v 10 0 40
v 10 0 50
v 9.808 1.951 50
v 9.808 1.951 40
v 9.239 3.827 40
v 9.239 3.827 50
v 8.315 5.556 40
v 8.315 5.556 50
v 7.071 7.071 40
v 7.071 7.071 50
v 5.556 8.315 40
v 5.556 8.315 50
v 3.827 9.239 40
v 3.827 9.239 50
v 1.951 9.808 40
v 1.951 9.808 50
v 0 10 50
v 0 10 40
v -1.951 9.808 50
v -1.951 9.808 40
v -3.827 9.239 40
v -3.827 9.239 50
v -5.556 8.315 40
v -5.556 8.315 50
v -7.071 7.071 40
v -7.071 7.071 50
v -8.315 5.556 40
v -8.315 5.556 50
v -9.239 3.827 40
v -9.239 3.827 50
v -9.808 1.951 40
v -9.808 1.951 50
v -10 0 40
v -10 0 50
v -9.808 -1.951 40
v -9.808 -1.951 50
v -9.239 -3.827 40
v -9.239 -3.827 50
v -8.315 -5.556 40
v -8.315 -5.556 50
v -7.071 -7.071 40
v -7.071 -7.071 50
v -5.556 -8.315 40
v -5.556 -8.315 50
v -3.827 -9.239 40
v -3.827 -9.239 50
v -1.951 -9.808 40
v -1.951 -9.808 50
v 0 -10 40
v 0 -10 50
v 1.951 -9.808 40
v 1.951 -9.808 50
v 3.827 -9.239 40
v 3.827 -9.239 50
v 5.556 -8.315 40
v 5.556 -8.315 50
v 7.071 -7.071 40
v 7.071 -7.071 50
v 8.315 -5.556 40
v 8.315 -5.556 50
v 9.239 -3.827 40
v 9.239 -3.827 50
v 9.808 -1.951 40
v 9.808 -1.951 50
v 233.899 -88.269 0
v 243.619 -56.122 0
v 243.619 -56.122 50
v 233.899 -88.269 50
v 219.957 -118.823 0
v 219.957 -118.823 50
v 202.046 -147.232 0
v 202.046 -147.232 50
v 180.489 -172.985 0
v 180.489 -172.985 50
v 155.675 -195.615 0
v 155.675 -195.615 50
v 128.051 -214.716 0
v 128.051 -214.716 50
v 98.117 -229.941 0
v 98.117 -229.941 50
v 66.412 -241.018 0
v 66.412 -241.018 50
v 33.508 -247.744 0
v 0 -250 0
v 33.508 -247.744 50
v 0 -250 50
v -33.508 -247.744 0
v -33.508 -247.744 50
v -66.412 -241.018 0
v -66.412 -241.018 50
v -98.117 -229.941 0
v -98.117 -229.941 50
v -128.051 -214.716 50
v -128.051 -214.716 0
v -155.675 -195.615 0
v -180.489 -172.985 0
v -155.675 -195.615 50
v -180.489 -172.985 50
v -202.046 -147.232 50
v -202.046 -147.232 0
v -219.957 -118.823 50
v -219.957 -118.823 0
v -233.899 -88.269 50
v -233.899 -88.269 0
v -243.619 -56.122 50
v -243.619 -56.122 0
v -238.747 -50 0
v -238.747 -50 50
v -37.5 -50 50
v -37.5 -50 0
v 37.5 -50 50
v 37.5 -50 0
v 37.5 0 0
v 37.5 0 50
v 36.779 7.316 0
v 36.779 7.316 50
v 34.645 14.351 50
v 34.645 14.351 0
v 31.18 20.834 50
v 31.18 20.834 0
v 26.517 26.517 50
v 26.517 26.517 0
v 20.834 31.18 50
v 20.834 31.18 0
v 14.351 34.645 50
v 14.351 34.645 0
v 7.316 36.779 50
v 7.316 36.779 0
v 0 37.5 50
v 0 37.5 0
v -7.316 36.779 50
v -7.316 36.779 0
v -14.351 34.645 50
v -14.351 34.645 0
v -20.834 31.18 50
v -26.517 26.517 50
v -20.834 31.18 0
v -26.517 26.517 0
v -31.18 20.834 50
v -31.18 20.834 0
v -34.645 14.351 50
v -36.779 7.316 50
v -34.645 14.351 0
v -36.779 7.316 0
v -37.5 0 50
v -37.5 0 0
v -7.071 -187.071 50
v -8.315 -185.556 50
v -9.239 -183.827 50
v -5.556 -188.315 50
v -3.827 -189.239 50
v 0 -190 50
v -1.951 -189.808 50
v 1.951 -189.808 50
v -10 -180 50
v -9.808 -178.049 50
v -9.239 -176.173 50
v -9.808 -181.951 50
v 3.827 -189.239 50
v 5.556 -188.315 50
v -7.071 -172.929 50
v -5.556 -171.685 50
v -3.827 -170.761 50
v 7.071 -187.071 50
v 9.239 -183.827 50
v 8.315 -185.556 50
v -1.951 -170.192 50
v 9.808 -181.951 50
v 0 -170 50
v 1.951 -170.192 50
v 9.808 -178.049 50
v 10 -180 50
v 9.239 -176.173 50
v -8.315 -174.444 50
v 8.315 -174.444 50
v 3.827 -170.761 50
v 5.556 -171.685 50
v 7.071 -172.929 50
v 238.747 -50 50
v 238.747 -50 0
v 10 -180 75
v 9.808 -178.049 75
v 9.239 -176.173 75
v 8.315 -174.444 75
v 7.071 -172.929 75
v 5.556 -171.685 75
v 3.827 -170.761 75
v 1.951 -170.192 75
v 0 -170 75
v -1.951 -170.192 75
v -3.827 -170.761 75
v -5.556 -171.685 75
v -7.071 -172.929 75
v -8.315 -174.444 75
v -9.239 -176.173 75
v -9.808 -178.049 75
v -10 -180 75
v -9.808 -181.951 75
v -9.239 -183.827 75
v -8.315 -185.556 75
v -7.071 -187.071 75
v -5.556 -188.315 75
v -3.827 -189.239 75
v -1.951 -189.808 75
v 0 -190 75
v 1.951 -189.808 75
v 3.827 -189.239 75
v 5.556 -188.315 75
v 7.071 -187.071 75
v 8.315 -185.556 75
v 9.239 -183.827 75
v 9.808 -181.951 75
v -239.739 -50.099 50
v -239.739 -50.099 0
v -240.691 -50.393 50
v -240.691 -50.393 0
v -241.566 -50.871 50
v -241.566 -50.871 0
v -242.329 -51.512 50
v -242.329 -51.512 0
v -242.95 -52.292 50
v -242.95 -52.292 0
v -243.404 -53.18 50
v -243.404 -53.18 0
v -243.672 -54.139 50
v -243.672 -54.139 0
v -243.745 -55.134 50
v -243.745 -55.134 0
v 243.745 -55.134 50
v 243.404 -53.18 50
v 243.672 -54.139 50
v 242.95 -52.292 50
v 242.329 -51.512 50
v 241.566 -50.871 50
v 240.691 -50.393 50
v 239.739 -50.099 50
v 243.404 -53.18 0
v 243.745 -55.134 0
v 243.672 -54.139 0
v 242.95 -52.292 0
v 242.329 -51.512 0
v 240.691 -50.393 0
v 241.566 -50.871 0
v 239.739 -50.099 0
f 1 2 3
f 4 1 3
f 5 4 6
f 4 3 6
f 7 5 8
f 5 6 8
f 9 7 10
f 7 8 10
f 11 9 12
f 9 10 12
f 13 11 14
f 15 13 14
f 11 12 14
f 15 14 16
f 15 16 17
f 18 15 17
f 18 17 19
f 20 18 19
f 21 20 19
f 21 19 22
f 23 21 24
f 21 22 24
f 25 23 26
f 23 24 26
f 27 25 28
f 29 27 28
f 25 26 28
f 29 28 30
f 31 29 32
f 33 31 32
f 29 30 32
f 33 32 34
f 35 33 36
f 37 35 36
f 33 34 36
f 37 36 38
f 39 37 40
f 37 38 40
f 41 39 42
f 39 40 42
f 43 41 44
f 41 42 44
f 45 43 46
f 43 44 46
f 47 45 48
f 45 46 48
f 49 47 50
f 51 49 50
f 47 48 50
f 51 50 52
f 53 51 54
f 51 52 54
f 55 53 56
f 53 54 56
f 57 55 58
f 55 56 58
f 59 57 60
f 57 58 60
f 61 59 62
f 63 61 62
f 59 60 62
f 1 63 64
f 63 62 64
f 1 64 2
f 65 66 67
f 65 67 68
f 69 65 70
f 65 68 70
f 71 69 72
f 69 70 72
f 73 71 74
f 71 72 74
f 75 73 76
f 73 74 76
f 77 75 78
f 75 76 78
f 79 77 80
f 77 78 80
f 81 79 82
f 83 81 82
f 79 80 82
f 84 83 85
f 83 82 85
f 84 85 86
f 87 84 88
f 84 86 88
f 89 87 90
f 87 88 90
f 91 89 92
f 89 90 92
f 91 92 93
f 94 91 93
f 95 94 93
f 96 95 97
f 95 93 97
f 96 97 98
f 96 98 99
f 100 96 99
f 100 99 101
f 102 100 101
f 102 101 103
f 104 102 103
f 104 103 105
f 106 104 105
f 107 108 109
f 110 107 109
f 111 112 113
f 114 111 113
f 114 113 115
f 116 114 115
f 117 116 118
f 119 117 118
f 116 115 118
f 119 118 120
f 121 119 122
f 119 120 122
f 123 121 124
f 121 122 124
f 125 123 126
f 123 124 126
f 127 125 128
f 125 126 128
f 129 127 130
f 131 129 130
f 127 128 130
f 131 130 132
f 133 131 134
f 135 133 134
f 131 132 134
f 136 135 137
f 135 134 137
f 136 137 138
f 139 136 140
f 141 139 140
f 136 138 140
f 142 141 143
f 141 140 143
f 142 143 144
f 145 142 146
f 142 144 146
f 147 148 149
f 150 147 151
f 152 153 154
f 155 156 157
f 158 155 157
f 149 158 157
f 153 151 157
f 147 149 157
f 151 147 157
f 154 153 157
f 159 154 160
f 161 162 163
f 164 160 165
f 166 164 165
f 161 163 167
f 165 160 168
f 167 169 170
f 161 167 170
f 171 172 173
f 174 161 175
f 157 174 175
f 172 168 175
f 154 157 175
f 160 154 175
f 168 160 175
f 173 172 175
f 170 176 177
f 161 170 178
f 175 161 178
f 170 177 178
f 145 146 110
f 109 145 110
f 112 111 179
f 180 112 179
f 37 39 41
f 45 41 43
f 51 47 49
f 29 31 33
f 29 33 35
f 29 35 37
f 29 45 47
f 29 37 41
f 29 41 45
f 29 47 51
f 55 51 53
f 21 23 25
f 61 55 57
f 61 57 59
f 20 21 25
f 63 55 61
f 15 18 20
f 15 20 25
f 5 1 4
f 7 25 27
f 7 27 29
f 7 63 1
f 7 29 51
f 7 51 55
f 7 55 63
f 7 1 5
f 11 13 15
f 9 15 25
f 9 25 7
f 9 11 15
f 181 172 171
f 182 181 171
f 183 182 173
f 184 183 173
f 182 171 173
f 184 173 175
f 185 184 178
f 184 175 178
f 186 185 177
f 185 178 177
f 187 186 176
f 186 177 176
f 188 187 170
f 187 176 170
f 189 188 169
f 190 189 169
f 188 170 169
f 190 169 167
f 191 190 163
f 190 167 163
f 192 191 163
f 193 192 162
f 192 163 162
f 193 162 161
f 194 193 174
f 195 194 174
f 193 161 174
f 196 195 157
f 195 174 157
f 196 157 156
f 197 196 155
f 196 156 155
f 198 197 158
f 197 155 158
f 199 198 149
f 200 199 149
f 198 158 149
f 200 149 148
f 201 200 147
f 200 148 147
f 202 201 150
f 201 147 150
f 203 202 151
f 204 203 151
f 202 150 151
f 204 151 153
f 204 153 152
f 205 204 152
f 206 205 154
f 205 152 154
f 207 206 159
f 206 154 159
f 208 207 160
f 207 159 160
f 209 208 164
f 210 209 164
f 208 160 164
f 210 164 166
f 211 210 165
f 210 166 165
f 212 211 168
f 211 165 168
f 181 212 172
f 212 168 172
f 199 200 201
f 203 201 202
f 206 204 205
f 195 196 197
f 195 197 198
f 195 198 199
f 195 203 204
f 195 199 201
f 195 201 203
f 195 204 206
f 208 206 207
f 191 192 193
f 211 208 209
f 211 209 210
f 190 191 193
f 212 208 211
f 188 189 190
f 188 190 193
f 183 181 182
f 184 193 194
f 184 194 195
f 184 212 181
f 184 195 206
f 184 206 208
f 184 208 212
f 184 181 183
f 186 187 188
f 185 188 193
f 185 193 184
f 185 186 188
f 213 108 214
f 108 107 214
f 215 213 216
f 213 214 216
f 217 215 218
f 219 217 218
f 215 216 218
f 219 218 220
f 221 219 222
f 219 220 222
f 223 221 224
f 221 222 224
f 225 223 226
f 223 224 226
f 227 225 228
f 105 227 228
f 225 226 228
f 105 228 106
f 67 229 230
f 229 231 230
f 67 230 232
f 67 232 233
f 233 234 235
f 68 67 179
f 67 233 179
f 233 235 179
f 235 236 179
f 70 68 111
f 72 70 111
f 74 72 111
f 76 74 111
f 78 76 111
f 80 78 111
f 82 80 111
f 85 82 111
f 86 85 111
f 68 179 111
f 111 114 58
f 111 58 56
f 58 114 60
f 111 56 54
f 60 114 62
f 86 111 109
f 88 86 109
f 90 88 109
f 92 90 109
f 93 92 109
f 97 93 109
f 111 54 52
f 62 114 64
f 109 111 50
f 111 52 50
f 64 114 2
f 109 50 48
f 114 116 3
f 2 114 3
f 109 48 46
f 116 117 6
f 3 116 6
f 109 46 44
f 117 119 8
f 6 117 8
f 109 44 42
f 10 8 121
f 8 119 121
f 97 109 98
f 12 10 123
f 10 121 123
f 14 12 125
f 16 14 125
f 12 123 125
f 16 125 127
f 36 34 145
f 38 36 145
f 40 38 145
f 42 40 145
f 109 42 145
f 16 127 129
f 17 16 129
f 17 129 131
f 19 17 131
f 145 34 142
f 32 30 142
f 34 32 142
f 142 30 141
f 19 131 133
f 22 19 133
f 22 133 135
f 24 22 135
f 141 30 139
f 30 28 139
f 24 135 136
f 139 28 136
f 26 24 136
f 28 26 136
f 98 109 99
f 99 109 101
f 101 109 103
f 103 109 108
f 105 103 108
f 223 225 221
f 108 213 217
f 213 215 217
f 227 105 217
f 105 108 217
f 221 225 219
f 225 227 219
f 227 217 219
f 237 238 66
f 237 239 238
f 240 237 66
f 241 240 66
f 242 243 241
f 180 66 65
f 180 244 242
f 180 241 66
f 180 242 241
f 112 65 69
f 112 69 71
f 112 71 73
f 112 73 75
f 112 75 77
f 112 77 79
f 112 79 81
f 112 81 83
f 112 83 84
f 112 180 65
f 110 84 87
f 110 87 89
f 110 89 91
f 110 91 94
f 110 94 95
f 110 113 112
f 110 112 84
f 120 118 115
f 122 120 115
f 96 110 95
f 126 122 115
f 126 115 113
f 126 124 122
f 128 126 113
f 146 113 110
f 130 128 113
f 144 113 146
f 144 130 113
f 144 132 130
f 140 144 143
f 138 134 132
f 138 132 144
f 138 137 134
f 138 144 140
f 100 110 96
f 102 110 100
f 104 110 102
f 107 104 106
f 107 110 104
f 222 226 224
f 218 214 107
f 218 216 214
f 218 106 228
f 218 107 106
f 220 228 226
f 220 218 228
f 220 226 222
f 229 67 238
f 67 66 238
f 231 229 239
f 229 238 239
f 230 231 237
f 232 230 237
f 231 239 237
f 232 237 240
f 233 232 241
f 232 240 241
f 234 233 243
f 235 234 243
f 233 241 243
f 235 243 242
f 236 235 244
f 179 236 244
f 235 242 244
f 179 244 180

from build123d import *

# Parameters (mm, degrees)
BOSS_EXTRUDE1_DEPTH = 50
SKETCH2_R           = 10
CUT_EXTRUDE1_DEPTH  = 10
BOSS_EXTRUDE2_DEPTH = 50
FILLET1_R           = 5
SKETCH4_R           = 10
BOSS_EXTRUDE3_DEPTH = 25


with BuildPart() as part:
    # Sketch1 → Boss-Extrude1 (new body)
    with BuildSketch(Plane.XY):
        with BuildLine():
            Line((-37.5, 0), (-37.5, -100))
            Line((-37.5, -100), (37.5, -100))
            Line((37.5, -100), (37.5, 0))
            ThreePointArc((37.5, 0), (0, 37.5), (-37.5, 0))
        make_face()
    extrude(amount=BOSS_EXTRUDE1_DEPTH)

    # Sketch2 → Cut-Extrude1 (cut)
    with BuildSketch(Plane.XY.offset(50)):
        Circle(SKETCH2_R)
    extrude(amount=-CUT_EXTRUDE1_DEPTH, mode=Mode.SUBTRACT)

    # Sketch3 → Boss-Extrude2 (add)
    with BuildSketch(Plane.XY.offset(50)):
        with BuildLine():
            Line((-244.948974278, -50), (244.948974278, -50))
            ThreePointArc((244.948974278, -50), (0, -250), (-244.948974278, -50))
        make_face()
    extrude(amount=-BOSS_EXTRUDE2_DEPTH)

    # Fillet1
    fillet1_edges = [part.edges().sort_by_distance(p)[0] for p in [
        (-244.948974278, -50, 25),
        (244.948974278, -50, 25),
    ]]
    fillet(fillet1_edges, radius=FILLET1_R)


with BuildPart() as body_2:
    # Sketch4 → Boss-Extrude3 (new body)
    with BuildSketch(Plane.XY.offset(50)):
        with Locations((0, -180)):
            Circle(SKETCH4_R)
    extrude(amount=BOSS_EXTRUDE3_DEPTH)


solid = Compound([part.part, body_2.part])
